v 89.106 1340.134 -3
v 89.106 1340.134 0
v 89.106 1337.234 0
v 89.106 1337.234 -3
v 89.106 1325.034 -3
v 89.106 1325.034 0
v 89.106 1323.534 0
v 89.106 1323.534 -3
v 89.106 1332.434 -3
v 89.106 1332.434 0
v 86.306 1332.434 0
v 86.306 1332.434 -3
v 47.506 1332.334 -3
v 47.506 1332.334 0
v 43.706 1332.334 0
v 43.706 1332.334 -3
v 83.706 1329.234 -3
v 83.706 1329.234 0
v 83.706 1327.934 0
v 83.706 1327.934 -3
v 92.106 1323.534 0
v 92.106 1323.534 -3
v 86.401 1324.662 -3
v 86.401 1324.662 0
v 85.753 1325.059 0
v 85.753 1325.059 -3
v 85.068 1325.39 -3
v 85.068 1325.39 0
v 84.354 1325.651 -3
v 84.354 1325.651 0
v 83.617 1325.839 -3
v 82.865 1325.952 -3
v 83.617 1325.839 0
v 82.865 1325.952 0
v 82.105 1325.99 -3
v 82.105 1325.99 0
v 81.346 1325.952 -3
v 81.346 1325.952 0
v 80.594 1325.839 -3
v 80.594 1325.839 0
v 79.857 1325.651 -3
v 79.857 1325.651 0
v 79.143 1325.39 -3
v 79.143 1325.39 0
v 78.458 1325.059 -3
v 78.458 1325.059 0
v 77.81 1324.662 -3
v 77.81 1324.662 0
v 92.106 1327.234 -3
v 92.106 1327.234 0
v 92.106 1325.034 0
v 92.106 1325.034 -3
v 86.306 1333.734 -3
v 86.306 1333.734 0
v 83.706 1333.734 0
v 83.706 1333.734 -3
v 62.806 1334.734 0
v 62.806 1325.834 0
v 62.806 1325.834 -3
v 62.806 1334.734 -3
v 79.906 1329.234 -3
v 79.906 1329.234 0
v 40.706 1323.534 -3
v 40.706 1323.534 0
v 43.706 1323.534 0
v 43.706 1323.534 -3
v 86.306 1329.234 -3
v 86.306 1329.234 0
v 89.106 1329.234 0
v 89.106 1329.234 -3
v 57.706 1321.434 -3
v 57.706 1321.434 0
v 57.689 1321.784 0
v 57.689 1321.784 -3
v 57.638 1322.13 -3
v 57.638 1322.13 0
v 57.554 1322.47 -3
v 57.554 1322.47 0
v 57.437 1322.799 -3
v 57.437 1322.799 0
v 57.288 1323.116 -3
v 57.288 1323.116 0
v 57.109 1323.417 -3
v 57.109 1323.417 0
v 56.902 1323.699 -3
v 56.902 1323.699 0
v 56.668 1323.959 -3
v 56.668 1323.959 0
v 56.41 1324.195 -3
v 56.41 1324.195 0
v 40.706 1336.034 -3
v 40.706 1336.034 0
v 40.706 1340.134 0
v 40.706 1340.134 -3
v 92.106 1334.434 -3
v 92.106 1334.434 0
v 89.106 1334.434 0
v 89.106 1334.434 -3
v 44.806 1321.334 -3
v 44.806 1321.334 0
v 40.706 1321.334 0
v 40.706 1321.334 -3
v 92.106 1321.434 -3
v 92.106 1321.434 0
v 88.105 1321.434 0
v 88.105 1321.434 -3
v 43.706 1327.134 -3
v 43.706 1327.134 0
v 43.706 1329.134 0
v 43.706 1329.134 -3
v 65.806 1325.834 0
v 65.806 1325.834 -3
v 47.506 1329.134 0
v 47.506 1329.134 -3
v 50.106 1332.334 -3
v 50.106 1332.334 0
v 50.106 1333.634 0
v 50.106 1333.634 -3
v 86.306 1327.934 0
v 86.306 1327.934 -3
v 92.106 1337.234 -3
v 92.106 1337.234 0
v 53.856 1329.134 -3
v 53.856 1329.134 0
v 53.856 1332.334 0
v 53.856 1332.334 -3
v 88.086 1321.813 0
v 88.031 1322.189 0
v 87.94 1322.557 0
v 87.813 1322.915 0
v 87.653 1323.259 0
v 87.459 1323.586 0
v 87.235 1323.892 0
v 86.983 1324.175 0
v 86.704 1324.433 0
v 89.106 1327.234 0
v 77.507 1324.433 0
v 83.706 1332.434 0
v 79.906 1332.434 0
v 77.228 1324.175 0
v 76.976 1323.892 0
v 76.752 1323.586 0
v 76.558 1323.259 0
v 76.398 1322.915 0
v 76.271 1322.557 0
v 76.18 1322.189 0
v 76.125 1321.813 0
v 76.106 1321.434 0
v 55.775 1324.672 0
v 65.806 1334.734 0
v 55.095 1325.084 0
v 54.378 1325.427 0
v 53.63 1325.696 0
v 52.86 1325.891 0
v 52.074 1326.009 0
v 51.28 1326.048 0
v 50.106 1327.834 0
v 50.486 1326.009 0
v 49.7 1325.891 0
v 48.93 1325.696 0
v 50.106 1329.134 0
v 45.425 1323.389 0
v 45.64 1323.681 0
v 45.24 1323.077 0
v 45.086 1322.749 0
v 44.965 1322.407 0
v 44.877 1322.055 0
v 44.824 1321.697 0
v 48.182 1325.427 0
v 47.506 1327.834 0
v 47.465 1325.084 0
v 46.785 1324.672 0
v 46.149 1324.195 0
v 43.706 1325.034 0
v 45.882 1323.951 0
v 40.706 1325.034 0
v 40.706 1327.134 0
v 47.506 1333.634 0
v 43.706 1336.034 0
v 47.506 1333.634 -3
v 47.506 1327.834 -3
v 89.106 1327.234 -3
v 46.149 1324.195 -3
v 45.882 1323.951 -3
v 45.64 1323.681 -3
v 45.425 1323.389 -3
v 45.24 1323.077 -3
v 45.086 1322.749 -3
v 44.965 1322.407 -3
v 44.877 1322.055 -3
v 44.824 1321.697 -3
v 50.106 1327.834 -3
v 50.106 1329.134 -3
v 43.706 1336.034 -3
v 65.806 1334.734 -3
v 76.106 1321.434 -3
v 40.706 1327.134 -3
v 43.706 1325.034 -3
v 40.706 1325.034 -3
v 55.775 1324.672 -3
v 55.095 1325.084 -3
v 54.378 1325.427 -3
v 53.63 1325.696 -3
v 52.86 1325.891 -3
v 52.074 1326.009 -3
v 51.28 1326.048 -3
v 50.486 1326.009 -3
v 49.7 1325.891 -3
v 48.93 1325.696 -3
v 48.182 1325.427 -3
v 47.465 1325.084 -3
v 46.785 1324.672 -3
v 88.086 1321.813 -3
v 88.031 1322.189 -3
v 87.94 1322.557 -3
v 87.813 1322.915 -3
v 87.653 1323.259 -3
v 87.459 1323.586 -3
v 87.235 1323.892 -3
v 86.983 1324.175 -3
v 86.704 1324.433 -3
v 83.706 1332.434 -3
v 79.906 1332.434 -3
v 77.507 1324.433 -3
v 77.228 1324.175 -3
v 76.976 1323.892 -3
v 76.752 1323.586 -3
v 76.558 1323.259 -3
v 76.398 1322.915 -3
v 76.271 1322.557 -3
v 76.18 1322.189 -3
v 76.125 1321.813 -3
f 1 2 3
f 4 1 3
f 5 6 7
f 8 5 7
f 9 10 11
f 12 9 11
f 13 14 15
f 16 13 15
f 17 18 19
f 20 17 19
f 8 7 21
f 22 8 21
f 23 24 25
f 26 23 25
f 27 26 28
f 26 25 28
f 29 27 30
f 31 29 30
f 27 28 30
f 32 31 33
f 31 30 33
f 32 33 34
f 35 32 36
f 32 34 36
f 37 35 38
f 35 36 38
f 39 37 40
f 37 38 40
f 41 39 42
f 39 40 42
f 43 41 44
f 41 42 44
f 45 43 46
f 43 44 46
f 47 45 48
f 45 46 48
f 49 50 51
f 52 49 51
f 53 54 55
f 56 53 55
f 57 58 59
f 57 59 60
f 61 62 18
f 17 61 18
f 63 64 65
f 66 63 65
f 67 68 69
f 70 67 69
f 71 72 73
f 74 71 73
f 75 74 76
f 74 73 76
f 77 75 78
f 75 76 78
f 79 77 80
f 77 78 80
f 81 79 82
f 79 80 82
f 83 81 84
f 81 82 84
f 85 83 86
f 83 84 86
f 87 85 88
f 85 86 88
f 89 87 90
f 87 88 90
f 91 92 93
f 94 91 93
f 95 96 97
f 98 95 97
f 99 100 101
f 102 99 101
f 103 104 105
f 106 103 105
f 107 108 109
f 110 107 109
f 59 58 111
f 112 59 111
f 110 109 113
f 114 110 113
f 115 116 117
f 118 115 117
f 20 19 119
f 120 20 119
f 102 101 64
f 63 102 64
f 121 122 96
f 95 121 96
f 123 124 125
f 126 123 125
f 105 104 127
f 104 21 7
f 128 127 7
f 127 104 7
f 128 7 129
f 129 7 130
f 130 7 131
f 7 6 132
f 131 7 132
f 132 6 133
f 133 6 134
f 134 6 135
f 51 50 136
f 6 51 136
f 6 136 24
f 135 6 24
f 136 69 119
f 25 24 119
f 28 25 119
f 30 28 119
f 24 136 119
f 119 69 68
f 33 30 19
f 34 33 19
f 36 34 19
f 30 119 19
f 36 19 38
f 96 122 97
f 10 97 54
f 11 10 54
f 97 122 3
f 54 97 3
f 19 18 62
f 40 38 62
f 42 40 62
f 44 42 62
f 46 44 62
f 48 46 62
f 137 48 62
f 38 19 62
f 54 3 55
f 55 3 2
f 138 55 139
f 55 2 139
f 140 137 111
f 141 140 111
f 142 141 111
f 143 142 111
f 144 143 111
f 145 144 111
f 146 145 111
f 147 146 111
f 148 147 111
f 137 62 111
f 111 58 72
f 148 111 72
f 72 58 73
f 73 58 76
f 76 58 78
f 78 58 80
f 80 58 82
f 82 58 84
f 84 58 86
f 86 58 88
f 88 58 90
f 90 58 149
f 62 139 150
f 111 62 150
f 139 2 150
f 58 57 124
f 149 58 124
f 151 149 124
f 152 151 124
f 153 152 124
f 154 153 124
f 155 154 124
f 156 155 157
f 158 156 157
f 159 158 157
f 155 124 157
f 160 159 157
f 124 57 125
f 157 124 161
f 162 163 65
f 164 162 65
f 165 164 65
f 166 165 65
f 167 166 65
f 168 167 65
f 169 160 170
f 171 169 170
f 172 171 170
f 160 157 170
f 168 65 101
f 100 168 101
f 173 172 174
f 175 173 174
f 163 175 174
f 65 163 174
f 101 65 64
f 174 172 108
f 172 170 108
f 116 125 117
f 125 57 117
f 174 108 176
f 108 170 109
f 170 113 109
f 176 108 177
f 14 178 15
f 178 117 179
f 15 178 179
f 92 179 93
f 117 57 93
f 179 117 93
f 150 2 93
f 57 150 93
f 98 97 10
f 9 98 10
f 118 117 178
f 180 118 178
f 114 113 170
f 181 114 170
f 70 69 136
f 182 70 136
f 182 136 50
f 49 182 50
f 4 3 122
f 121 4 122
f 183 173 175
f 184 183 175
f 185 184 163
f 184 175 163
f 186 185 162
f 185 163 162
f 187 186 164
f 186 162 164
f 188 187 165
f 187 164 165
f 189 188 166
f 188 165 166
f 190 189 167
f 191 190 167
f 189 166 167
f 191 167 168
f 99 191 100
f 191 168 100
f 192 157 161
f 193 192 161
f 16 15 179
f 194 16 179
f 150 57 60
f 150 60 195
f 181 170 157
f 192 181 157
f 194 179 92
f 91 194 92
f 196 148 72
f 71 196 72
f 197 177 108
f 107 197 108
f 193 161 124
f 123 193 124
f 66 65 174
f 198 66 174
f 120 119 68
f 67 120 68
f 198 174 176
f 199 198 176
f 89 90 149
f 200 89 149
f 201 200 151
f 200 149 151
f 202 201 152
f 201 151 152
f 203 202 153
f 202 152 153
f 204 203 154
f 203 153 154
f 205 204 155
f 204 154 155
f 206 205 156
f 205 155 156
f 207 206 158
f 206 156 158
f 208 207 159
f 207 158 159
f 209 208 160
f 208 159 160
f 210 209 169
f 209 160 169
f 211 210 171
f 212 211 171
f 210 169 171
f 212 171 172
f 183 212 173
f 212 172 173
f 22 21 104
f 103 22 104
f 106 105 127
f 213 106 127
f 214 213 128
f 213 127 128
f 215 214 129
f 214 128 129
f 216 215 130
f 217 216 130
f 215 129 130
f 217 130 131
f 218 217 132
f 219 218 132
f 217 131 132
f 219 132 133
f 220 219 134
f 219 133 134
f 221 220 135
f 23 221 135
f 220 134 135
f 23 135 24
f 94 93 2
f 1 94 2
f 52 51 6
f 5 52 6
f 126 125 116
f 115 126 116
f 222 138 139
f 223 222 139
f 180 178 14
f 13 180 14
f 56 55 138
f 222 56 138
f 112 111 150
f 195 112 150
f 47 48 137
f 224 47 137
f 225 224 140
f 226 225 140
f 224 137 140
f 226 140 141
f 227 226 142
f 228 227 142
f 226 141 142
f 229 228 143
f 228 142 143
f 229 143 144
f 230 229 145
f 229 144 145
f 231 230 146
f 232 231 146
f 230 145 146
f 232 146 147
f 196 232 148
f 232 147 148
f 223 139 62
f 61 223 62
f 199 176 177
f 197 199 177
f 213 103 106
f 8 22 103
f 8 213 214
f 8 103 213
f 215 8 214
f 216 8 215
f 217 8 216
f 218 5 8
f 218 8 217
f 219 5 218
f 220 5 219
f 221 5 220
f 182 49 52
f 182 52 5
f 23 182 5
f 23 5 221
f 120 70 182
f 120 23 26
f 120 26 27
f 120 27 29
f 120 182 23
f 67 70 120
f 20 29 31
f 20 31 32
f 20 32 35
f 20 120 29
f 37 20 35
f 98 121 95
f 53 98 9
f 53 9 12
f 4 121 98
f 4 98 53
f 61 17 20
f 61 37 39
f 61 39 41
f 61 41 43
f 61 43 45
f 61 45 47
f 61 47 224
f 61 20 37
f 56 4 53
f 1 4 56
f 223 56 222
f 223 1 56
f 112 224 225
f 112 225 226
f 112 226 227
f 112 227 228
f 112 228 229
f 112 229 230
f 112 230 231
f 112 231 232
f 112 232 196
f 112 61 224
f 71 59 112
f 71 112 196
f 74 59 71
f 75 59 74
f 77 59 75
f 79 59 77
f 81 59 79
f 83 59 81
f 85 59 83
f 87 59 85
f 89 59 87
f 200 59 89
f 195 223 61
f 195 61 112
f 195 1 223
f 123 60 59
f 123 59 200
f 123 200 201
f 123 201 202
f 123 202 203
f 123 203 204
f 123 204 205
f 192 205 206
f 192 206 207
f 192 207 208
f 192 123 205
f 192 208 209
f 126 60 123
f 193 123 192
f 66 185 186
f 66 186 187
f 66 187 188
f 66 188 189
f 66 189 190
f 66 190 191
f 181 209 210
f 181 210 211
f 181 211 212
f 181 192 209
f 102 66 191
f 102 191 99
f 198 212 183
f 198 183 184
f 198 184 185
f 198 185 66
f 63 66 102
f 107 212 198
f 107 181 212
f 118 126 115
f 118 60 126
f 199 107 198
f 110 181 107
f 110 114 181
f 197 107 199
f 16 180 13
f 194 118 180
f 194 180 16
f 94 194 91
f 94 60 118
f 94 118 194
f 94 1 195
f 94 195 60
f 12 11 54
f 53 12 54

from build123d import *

# Parameters (mm, degrees)
ESQUISSE1_W               = 3
ESQUISSE1_H               = 8.9
T_LE_DE_BASE_PLI_E1_DEPTH = 3


# Sheet-metal steps are written as plain solids
with BuildPart() as part:
    # Esquisse1 → Tôle de base pliée1 (new body)
    with BuildSketch(Plane.XY):
        with BuildLine():
            Line((40.706473987, 1340.134366737), (89.106473987, 1340.134366737))
            Line((89.106473987, 1340.134366737), (89.106473987, 1337.234366737))
            Line((89.106473987, 1337.234366737), (92.106473987, 1337.234366737))
            Line((92.106473987, 1337.234366737), (92.106473987, 1334.434366737))
            Line((92.106473987, 1334.434366737), (89.106473987, 1334.434366737))
            Line((89.106473987, 1334.434366737), (89.106473987, 1332.434279902))
            Line((89.106473987, 1332.434279902), (86.306473987, 1332.434279902))
            Line((86.306473987, 1332.434279902), (86.306473987, 1333.734279902))
            Line((86.306473987, 1333.734279902), (83.706473987, 1333.734279902))
            Line((83.706473987, 1333.734279902), (83.706473987, 1332.434279902))
            Line((83.706473987, 1332.434279902), (79.906473987, 1332.434279902))
            Line((79.906473987, 1332.434279902), (79.906473987, 1329.234279902))
            Line((79.906473987, 1329.234279902), (83.706473987, 1329.234279902))
            Line((83.706473987, 1329.234279902), (83.706473987, 1327.934279902))
            Line((83.706473987, 1327.934279902), (86.306473987, 1327.934279902))
            Line((86.306473987, 1327.934279902), (86.306473987, 1329.234279902))
            Line((86.306473987, 1329.234279902), (89.106473987, 1329.234279902))
            Line((89.106473987, 1329.234279902), (89.106473987, 1327.234279902))
            Line((89.106473987, 1327.234279902), (92.106473987, 1327.234279902))
            Line((92.106473987, 1327.234279902), (92.106473987, 1325.034279902))
            Line((92.106473987, 1325.034279902), (89.106473987, 1325.034279902))
            Line((89.106473987, 1325.034279902), (89.106473987, 1323.534279902))
            Line((89.106473987, 1323.534279902), (92.106473987, 1323.534279902))
            Line((92.106473987, 1323.534279902), (92.106473987, 1321.434279902))
            Line((92.106473987, 1321.434279902), (88.10455642, 1321.434279902))
            ThreePointArc((88.10455642, 1321.434279902), (87.652661624, 1323.258995148), (86.401432588, 1324.661927983))
            ThreePointArc((86.401432588, 1324.661927983), (82.105492294, 1325.990171363), (77.809552, 1324.661927983))
            ThreePointArc((77.809552, 1324.661927983), (76.558356626, 1323.259032892), (76.106473987, 1321.434366737))
            Line((76.106473987, 1321.434366737), (57.706473987, 1321.434366737))
            ThreePointArc((57.706473987, 1321.434366737), (57.366344351, 1322.959443215), (56.410421102, 1324.195467962))
            ThreePointArc((56.410421102, 1324.195467962), (51.279943841, 1326.048095935), (46.149466581, 1324.195467962))
            ThreePointArc((46.149466581, 1324.195467962), (45.158922245, 1322.914677571), (44.806473987, 1321.334366737))
            Line((44.806473987, 1321.334366737), (40.706473987, 1321.334366737))
            Line((40.706473987, 1321.334366737), (40.706473987, 1323.534366737))
            Line((40.706473987, 1323.534366737), (43.706473987, 1323.534366737))
            Line((43.706473987, 1323.534366737), (43.706473987, 1325.034366737))
            Line((43.706473987, 1325.034366737), (40.706473987, 1325.034366737))
            Line((40.706473987, 1325.034366737), (40.706473987, 1327.134366737))
            Line((40.706473987, 1327.134366737), (43.706473987, 1327.134366737))
            Line((43.706473987, 1327.134366737), (43.706473987, 1329.134366737))
            Line((43.706473987, 1329.134366737), (47.506473987, 1329.134366737))
            Line((47.506473987, 1329.134366737), (47.506473987, 1327.834366737))
            Line((47.506473987, 1327.834366737), (50.106473987, 1327.834366737))
            Line((50.106473987, 1327.834366737), (50.106473987, 1329.134366737))
            Line((50.106473987, 1329.134366737), (53.856473987, 1329.134366737))
            Line((53.856473987, 1329.134366737), (53.856473987, 1332.334366737))
            Line((53.856473987, 1332.334366737), (50.106473987, 1332.334366737))
            Line((50.106473987, 1332.334366737), (50.106473987, 1333.634366737))
            Line((50.106473987, 1333.634366737), (47.506473987, 1333.634366737))
            Line((47.506473987, 1333.634366737), (47.506473987, 1332.334366737))
            Line((47.506473987, 1332.334366737), (43.706473987, 1332.334366737))
            Line((43.706473987, 1332.334366737), (43.706473987, 1336.034366737))
            Line((43.706473987, 1336.034366737), (40.706473987, 1336.034366737))
            Line((40.706473987, 1336.034366737), (40.706473987, 1340.134366737))
        make_face()
        with Locations((64.306473987, 1330.284366737)):
            Rectangle(ESQUISSE1_W, ESQUISSE1_H, mode=Mode.SUBTRACT)
    extrude(amount=-T_LE_DE_BASE_PLI_E1_DEPTH)


solid = part.part
